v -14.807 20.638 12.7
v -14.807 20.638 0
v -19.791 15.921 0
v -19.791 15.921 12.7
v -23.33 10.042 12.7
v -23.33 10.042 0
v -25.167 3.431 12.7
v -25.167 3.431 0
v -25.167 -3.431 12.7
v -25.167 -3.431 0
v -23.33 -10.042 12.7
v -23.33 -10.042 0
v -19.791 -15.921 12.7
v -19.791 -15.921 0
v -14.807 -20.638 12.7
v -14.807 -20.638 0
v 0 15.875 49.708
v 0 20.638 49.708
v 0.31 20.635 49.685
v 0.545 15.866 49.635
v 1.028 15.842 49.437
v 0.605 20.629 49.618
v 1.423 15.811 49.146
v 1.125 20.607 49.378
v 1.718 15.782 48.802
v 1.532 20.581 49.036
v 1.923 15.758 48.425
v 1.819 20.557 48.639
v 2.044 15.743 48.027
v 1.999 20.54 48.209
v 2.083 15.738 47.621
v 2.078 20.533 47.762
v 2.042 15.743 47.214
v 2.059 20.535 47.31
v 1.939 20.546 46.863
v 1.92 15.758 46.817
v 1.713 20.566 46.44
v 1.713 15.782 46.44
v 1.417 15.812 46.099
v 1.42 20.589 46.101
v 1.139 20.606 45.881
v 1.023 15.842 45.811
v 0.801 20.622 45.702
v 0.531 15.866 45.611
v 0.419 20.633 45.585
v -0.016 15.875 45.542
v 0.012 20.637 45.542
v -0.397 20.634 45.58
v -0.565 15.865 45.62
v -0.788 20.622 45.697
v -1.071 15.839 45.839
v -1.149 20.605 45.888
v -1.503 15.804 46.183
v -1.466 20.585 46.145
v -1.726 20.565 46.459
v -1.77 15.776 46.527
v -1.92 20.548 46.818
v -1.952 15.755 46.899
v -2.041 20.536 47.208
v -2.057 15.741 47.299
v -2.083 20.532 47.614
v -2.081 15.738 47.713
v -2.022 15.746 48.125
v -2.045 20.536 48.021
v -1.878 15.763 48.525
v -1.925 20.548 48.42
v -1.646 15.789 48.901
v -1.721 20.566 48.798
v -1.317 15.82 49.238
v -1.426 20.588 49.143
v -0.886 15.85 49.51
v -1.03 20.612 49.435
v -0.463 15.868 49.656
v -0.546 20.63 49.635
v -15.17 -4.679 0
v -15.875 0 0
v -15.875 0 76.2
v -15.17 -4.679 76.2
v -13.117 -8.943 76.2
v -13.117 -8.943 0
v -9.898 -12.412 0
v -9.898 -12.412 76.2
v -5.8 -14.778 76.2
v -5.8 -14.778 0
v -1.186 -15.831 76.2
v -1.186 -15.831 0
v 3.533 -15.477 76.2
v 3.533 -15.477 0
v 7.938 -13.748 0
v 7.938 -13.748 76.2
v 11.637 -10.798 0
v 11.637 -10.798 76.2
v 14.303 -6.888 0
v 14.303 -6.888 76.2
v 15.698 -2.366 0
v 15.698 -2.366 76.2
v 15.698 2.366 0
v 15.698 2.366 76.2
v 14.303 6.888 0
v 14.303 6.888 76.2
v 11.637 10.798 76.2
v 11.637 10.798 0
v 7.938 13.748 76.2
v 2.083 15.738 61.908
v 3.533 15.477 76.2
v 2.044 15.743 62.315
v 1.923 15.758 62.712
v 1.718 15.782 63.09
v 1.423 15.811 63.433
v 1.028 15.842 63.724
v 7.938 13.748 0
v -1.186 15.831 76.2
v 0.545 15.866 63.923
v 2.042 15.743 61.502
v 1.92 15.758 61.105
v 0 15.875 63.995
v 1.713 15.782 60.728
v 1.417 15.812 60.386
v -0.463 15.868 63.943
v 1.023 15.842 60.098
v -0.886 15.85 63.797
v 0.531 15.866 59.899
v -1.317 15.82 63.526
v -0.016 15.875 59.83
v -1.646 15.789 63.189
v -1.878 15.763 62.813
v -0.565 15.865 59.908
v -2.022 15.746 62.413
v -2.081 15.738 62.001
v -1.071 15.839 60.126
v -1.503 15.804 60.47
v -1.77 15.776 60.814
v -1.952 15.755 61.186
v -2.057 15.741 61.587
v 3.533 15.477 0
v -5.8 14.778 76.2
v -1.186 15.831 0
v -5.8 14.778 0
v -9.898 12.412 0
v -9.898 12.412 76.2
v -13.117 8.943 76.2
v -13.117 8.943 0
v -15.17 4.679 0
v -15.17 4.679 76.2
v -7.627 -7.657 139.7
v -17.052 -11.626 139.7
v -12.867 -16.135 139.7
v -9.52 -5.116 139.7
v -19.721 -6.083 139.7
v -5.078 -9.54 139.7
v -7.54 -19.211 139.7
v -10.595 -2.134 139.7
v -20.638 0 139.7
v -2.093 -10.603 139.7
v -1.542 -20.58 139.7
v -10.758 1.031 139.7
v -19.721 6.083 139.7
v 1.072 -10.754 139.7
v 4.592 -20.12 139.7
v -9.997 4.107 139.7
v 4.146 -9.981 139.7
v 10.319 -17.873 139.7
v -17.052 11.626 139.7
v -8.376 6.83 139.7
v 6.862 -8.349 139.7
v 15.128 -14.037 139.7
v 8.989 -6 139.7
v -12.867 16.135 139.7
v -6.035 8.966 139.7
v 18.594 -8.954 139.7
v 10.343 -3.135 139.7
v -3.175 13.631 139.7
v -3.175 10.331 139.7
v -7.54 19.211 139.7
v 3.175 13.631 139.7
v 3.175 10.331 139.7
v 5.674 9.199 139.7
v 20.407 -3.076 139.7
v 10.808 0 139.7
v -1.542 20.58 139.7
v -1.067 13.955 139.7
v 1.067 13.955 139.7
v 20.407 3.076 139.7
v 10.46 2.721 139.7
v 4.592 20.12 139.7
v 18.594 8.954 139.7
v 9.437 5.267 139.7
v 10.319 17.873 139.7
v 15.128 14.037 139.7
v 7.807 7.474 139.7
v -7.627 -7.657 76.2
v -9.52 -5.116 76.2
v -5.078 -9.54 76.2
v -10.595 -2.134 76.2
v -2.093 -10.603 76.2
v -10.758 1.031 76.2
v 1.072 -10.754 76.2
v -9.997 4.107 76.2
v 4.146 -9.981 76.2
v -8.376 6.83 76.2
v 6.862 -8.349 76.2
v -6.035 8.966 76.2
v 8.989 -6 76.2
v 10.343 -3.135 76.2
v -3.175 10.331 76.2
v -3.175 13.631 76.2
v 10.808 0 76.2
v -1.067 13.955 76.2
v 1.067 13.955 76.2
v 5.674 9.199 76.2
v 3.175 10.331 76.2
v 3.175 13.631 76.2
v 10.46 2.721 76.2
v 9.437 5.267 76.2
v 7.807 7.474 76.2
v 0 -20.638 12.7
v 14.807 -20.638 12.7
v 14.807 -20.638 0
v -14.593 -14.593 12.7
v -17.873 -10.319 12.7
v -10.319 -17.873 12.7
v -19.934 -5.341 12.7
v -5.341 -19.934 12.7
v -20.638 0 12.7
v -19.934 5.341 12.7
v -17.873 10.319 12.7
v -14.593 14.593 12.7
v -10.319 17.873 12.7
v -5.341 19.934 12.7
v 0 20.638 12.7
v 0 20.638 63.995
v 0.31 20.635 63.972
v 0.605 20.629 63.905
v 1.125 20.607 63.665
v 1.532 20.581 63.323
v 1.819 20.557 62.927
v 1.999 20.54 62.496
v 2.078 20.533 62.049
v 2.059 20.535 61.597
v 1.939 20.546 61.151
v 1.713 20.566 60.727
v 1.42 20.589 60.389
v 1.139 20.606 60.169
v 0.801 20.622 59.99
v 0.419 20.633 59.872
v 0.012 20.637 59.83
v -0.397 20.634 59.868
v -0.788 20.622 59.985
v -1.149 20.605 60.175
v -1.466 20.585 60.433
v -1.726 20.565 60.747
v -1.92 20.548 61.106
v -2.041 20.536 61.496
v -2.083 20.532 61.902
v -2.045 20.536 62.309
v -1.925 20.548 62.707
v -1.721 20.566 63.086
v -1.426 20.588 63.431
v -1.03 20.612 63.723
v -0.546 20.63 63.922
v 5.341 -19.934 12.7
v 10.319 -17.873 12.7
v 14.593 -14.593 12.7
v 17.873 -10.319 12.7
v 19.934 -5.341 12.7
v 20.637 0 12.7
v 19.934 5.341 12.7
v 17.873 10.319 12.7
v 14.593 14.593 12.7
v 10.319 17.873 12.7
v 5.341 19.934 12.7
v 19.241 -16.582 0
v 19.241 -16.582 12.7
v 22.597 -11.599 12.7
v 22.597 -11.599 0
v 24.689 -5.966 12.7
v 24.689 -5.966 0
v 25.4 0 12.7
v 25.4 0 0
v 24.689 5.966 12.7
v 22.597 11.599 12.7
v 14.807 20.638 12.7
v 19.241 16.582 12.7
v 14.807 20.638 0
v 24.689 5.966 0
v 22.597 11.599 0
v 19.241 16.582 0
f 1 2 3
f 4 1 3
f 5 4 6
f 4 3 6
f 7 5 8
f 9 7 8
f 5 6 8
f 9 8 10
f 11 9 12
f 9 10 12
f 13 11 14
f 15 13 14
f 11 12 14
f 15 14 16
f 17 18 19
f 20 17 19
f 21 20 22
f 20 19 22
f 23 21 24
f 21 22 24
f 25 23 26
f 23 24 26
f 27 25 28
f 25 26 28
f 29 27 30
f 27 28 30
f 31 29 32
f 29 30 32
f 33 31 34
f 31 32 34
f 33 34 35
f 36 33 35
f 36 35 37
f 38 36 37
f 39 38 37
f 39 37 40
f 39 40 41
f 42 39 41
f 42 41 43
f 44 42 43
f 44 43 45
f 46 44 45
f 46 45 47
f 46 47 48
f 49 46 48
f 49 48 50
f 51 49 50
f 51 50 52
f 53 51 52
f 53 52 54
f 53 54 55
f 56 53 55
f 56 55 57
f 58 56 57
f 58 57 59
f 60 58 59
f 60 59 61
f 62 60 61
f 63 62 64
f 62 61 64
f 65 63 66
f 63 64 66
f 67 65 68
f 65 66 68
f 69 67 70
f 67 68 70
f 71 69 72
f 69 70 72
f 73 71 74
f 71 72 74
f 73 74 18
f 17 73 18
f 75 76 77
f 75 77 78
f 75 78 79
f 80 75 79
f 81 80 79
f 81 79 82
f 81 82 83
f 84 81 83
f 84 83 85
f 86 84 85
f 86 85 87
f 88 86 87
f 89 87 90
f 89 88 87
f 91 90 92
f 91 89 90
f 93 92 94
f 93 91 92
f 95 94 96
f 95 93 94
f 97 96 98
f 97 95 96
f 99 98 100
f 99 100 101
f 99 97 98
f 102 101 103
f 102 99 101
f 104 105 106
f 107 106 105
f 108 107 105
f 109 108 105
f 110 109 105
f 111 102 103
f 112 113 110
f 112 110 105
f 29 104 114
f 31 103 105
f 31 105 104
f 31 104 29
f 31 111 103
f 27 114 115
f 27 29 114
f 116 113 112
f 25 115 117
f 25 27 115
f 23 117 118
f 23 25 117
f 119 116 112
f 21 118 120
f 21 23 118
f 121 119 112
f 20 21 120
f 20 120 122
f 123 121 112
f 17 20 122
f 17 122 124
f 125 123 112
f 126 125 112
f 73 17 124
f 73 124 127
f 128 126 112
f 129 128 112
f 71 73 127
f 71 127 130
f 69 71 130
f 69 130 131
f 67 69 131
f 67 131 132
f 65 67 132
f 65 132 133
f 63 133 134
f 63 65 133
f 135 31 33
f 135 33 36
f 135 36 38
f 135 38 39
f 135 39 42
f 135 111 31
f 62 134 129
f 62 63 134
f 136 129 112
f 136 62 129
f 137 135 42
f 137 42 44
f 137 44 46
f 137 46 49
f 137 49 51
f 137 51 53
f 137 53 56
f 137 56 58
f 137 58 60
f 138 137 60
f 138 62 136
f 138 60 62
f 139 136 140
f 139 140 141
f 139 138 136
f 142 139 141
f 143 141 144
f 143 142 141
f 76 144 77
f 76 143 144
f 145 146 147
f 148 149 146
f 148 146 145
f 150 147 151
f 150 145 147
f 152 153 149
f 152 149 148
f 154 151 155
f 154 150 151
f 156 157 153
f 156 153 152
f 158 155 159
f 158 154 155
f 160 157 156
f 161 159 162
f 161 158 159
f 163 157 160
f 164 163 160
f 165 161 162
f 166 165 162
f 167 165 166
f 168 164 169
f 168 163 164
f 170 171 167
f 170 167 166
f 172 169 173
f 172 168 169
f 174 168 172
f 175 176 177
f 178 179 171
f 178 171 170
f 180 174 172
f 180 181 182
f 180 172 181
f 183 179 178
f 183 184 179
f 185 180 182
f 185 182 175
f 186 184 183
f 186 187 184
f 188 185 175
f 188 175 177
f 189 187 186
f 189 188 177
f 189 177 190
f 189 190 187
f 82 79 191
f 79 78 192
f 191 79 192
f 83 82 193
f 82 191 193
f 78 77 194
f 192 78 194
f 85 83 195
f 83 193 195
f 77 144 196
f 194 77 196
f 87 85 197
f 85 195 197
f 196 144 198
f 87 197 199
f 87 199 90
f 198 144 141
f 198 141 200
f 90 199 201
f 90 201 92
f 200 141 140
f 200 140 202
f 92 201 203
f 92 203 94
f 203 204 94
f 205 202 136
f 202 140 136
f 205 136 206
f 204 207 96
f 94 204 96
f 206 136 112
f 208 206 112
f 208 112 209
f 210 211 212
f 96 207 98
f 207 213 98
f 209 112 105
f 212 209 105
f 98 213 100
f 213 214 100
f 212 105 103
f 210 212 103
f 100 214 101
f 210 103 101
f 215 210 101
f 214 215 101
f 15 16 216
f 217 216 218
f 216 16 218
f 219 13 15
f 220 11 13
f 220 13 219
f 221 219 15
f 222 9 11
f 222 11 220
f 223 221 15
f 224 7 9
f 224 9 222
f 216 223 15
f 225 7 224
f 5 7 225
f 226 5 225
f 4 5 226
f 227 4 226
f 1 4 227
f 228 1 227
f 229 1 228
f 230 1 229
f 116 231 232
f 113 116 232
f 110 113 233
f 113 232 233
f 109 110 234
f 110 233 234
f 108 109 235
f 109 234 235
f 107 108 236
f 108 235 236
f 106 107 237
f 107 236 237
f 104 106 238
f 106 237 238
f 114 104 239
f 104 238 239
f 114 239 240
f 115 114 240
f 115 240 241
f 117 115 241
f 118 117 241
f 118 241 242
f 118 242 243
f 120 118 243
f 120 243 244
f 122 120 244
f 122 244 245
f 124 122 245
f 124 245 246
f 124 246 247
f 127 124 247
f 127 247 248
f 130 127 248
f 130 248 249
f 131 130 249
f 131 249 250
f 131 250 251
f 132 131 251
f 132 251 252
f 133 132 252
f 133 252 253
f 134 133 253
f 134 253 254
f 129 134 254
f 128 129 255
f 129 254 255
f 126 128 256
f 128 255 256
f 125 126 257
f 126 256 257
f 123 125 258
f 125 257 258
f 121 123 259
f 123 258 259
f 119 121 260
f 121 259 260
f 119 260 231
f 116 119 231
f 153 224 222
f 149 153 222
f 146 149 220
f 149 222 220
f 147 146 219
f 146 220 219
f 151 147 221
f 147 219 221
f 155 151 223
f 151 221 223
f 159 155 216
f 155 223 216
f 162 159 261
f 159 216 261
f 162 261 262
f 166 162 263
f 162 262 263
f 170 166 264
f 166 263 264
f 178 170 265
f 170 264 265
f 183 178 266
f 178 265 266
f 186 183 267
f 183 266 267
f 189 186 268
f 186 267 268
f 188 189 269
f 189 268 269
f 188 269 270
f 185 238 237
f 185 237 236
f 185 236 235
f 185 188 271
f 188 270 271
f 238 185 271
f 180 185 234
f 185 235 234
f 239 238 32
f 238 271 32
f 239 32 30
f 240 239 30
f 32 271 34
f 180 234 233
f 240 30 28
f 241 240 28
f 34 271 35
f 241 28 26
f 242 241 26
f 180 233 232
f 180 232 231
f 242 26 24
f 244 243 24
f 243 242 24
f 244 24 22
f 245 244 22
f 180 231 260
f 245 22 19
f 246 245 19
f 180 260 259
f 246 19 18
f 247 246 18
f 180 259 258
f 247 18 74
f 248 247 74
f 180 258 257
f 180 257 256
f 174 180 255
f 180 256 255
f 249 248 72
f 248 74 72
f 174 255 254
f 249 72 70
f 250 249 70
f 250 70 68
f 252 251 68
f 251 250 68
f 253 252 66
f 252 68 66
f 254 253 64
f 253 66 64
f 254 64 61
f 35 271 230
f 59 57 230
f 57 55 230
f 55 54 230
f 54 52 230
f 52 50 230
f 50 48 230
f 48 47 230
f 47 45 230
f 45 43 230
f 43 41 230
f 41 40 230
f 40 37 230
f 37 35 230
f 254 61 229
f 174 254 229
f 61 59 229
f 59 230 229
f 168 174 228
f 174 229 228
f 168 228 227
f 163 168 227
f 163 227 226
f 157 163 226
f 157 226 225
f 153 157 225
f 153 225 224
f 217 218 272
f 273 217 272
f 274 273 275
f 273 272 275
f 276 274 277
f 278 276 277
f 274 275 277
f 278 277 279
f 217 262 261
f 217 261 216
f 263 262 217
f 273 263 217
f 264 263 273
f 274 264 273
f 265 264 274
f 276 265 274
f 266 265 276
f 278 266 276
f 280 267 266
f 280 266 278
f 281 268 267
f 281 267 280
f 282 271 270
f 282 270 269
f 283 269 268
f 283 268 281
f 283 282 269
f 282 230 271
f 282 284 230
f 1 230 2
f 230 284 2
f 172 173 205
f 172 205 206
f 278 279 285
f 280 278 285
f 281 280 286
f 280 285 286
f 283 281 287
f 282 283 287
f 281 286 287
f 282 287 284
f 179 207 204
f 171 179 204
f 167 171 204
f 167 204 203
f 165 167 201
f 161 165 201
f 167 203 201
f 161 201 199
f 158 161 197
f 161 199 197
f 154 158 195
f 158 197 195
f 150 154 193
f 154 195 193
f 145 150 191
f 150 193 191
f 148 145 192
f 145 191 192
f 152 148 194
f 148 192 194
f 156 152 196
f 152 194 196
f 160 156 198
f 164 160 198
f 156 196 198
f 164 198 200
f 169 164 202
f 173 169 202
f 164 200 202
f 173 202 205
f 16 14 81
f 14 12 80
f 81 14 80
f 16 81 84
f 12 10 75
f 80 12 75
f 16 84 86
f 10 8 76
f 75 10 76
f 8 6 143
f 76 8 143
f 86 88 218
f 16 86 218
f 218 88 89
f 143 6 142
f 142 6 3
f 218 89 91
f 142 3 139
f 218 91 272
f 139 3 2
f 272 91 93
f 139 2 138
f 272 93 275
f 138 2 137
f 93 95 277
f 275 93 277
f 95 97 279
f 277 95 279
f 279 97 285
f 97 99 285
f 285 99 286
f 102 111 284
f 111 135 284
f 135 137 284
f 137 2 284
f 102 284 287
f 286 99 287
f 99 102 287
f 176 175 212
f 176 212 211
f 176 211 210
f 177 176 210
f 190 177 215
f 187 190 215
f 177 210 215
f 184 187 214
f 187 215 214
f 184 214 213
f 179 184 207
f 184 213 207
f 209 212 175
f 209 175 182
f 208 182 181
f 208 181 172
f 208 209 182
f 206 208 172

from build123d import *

# Parameters (mm, degrees)
SKETCH1_R           = 20.6375
SKETCH1_R_2         = 15.875
BOSS_EXTRUDE1_DEPTH = 76.2
SKETCH2_R           = 20.6375
SKETCH2_R_2         = 13.9954
BOSS_EXTRUDE2_DEPTH = 63.5
BOSS_EXTRUDE3_DEPTH = 12.7
BOSS_EXTRUDE4_START = -63.5
BOSS_EXTRUDE4_DEPTH = 63.5
SKETCH5_R           = 2.0828
CUT_EXTRUDE1_DEPTH  = 13.208


with BuildPart() as part:
    # Sketch1 → Boss-Extrude1 (new body)
    with BuildSketch(Plane.XY):
        Circle(SKETCH1_R)
        Circle(SKETCH1_R_2, mode=Mode.SUBTRACT)
    extrude(amount=BOSS_EXTRUDE1_DEPTH)

    # Sketch2 → Boss-Extrude2 (add)
    with BuildSketch(Plane.XY.offset(76.2)):
        Circle(SKETCH2_R)
        Circle(SKETCH2_R_2, mode=Mode.SUBTRACT)
    extrude(amount=BOSS_EXTRUDE2_DEPTH)

    # Sketch3 → Boss-Extrude3 (add)
    with BuildSketch(Plane.XY):
        with BuildLine():
            ThreePointArc((14.807214247, -20.6375), (25.4, 0), (14.807214247, 20.6375))
            Line((14.807214247, 20.6375), (0, 20.6375))
            ThreePointArc((0, 20.6375), (20.6375, 3.1e-08), (6.2e-08, -20.6375))
            Line((6.2e-08, -20.6375), (14.807214247, -20.6375))
        make_face()
        with BuildLine():
            ThreePointArc((6.2e-08, -20.6375), (-20.6375, -3.1e-08), (0, 20.6375))
            Line((0, 20.6375), (-14.807214247, 20.6375))
            ThreePointArc((-14.807214247, 20.6375), (-25.4, 0), (-14.807214247, -20.6375))
            Line((-14.807214247, -20.6375), (6.2e-08, -20.6375))
        make_face()
    extrude(amount=BOSS_EXTRUDE3_DEPTH)

    # Sketch4 → Boss-Extrude4 (add)
    with BuildSketch(Plane.XY.offset(139.7).offset(BOSS_EXTRUDE4_START)):
        with BuildLine():
            ThreePointArc((10.8077, 0), (-6.422302227, -8.692549304), (-3.175, 10.330815761))
            Line((-3.175, 10.330815761), (-3.175, 13.630502418))
            ThreePointArc((-3.175, 13.630502418), (-8.701604052, -10.961446441), (13.9954, 0))
            ThreePointArc((13.9954, 0), (10.961446441, 8.701604052), (3.175, 13.630502418))
            Line((3.175, 13.630502418), (3.175, 10.330815761))
            ThreePointArc((3.175, 10.330815761), (8.692549304, 6.422302227), (10.8077, 0))
        make_face()
    extrude(amount=BOSS_EXTRUDE4_DEPTH)

    # Sketch5 → Cut-Extrude1 (cut)
    with BuildSketch(Plane(origin=(0, 20.6375, 0), x_dir=(1, 0, 0), z_dir=(0, 1, 0))):
        with Locations((0, -47.625)):
            Circle(SKETCH5_R)
        with Locations((0, -61.9125)):
            Circle(SKETCH5_R)
    extrude(amount=-CUT_EXTRUDE1_DEPTH, mode=Mode.SUBTRACT)


solid = part.part
